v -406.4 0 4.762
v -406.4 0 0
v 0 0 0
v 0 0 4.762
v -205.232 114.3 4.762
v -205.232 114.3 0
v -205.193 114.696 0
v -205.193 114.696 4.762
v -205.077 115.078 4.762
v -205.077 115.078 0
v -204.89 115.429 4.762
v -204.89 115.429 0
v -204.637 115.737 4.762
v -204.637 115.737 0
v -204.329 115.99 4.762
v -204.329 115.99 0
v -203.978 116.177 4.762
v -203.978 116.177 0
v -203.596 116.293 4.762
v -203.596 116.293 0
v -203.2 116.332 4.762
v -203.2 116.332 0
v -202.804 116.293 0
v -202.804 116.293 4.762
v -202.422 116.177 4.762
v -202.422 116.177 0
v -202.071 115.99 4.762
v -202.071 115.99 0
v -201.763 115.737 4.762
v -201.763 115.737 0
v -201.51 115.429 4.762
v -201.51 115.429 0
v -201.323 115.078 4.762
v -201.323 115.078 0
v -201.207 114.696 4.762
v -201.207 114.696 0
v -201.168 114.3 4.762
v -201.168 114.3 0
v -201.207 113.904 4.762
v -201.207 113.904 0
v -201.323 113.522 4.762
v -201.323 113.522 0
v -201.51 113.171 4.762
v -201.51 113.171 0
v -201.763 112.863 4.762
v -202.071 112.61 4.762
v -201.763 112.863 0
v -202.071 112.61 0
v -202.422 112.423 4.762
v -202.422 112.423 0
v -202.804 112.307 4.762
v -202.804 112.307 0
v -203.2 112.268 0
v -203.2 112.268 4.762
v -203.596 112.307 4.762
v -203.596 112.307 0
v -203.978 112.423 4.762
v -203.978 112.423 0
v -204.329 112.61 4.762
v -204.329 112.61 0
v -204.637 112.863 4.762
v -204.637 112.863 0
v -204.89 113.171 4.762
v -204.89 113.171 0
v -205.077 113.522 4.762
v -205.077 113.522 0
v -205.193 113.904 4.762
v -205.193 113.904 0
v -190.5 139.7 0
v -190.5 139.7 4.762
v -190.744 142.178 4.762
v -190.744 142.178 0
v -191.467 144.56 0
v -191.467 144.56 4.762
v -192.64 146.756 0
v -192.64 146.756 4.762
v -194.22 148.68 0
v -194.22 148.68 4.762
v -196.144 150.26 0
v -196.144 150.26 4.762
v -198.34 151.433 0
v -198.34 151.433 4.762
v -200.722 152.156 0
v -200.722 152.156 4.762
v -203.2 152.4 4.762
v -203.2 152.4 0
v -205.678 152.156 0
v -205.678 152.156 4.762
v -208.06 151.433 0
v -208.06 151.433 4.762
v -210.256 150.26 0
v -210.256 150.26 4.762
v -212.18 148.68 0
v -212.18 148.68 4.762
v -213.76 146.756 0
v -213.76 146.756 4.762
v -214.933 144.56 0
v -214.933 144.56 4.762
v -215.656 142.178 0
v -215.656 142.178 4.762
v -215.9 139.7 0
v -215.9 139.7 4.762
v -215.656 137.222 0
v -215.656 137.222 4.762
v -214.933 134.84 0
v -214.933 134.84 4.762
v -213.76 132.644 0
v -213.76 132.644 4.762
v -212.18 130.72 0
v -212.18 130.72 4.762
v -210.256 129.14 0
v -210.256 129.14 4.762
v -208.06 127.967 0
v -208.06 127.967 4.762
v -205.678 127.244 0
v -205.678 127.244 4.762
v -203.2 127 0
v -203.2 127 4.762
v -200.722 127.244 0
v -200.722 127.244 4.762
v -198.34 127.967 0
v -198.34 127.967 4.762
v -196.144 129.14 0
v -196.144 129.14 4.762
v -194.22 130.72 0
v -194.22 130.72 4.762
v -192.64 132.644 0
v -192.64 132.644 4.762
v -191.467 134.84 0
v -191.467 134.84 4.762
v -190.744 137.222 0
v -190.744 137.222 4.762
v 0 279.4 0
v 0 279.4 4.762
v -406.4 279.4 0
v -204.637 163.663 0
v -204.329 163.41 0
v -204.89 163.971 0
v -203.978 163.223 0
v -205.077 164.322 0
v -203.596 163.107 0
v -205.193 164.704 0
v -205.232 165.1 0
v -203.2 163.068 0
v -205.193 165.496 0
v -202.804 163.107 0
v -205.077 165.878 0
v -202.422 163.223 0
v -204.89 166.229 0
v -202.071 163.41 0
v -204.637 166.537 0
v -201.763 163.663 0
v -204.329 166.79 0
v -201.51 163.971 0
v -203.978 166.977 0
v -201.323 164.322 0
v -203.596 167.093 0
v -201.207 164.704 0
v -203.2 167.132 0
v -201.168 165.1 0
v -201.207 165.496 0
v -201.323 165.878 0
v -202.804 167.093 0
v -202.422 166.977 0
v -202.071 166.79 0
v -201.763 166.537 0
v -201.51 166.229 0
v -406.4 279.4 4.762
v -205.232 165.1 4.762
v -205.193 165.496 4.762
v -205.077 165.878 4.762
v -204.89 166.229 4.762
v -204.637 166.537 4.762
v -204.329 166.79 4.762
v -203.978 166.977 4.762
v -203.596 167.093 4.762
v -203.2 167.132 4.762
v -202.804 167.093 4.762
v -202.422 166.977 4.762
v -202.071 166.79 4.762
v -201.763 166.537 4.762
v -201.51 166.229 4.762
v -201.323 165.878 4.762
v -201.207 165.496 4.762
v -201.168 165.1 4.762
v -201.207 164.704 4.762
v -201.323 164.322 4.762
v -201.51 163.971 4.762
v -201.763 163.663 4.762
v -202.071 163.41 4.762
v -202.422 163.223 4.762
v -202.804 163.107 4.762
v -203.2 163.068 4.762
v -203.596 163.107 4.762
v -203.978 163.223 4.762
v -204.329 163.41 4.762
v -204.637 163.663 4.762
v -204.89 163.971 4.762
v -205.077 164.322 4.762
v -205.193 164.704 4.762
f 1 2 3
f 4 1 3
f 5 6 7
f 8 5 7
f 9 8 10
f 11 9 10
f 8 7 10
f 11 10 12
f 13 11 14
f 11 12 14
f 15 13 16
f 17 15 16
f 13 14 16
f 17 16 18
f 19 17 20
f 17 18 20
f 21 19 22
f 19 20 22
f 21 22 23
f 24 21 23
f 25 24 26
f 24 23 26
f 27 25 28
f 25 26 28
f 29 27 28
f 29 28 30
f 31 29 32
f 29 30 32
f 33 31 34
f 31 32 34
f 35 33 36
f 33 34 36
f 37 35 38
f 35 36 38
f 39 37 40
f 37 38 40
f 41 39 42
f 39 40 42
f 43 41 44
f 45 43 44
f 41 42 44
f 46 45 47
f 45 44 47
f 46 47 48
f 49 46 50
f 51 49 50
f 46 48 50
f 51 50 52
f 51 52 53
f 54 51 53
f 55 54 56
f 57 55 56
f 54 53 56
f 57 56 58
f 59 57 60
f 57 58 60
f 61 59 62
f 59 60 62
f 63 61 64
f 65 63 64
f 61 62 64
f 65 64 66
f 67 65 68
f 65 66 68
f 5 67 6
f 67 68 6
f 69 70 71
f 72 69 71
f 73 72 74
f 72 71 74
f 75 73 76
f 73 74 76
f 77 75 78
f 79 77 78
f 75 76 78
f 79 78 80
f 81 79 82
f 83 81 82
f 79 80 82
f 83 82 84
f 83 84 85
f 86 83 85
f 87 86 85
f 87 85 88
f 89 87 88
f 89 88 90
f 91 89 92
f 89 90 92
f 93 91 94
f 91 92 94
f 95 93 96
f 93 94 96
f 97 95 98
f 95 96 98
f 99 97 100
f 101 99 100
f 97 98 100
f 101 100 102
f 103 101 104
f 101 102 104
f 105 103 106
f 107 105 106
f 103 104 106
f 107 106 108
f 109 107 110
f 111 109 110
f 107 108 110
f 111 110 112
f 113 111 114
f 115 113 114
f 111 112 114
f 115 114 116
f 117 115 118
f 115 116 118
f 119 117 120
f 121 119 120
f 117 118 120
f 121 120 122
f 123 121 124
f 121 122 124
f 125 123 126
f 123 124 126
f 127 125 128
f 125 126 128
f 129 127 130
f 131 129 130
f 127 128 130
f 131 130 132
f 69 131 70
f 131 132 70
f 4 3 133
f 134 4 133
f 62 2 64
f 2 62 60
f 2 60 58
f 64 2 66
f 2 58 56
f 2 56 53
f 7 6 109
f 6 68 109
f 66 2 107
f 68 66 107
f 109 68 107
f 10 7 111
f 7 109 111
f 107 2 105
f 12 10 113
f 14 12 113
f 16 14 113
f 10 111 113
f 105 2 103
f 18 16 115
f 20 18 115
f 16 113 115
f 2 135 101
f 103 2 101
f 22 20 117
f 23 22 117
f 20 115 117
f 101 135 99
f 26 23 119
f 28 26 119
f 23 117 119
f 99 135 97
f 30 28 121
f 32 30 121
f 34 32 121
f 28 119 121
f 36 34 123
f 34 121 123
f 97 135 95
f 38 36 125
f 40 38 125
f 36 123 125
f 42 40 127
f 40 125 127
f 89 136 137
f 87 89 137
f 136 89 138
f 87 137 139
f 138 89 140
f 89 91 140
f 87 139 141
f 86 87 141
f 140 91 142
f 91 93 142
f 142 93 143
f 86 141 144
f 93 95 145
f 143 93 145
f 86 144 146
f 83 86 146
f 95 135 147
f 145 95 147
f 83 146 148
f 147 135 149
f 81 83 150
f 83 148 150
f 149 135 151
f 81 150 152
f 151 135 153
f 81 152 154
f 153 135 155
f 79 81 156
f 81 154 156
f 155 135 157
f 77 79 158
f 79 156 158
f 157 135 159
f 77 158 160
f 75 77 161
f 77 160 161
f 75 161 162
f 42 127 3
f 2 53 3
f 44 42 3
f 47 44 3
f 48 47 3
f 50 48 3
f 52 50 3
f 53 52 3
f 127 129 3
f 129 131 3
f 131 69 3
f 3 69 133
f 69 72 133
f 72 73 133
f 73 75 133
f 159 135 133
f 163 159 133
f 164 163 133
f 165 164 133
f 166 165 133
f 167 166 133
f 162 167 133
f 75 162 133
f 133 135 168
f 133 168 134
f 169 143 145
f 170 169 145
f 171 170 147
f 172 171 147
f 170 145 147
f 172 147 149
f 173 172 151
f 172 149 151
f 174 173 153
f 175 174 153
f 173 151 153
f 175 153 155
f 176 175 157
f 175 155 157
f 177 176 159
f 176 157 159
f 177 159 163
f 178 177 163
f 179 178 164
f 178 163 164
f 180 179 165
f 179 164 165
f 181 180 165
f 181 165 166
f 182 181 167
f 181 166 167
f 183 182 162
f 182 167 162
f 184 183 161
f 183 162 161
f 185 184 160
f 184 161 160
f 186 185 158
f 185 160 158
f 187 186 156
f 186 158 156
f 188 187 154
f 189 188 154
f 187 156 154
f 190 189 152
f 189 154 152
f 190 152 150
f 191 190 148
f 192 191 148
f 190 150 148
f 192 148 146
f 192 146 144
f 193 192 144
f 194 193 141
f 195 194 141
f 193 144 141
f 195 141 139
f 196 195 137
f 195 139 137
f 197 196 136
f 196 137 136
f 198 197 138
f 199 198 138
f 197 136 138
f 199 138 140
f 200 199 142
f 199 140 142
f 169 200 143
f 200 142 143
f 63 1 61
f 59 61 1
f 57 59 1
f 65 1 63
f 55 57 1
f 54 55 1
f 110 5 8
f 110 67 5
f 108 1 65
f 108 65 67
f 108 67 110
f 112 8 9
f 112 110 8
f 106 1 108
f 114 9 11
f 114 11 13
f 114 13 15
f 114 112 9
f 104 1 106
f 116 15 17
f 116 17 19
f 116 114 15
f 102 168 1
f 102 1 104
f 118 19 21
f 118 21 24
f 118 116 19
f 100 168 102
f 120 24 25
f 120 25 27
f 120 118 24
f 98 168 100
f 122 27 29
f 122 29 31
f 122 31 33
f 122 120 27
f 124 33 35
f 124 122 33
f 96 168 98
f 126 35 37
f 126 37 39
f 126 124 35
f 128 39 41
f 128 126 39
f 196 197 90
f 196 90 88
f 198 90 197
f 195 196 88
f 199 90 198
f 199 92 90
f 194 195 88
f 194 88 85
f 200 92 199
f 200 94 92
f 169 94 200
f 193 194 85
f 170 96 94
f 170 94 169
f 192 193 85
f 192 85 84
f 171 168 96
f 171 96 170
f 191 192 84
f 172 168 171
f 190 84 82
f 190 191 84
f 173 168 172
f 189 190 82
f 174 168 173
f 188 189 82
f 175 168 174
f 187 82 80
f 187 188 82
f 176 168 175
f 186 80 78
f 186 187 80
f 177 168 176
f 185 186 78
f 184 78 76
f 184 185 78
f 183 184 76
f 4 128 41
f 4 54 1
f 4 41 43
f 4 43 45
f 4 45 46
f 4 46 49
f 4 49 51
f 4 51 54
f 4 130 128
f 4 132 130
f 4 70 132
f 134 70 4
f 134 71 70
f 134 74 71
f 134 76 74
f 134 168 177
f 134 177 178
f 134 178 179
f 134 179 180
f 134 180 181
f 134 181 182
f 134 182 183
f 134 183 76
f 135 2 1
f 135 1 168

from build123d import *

# Parameters (mm, degrees)
SKETCH1_W           = 406.4
SKETCH1_H           = 279.4
BOSS_EXTRUDE1_DEPTH = 4.7625
SKETCH2_R           = 12.7
CUT_EXTRUDE1_DEPTH  = 4.7625
SKETCH3_R           = 2.032
CUT_EXTRUDE2_DEPTH  = 4.7625


with BuildPart() as part:
    # Sketch1 → Boss-Extrude1 (new body)
    with BuildSketch(Plane.XY):
        with Locations((-203.2, 139.7)):
            Rectangle(SKETCH1_W, SKETCH1_H)
    extrude(amount=BOSS_EXTRUDE1_DEPTH)

    # Sketch2 → Cut-Extrude1 (cut)
    with BuildSketch(Plane.XY.offset(4.7625)):
        with Locations((-203.2, 139.7)):
            Circle(SKETCH2_R)
    extrude(amount=-CUT_EXTRUDE1_DEPTH, mode=Mode.SUBTRACT)

    # Sketch3 → Cut-Extrude2 (cut)
    with BuildSketch(Plane(origin=(0, 0, 0), x_dir=(-1, 0, 0), z_dir=(0, 0, -1))):
        with Locations((203.2, 114.3)):
            Circle(SKETCH3_R)
        with Locations((203.2, 165.1)):
            Circle(SKETCH3_R)
    extrude(amount=-CUT_EXTRUDE2_DEPTH, mode=Mode.SUBTRACT)


solid = part.part
